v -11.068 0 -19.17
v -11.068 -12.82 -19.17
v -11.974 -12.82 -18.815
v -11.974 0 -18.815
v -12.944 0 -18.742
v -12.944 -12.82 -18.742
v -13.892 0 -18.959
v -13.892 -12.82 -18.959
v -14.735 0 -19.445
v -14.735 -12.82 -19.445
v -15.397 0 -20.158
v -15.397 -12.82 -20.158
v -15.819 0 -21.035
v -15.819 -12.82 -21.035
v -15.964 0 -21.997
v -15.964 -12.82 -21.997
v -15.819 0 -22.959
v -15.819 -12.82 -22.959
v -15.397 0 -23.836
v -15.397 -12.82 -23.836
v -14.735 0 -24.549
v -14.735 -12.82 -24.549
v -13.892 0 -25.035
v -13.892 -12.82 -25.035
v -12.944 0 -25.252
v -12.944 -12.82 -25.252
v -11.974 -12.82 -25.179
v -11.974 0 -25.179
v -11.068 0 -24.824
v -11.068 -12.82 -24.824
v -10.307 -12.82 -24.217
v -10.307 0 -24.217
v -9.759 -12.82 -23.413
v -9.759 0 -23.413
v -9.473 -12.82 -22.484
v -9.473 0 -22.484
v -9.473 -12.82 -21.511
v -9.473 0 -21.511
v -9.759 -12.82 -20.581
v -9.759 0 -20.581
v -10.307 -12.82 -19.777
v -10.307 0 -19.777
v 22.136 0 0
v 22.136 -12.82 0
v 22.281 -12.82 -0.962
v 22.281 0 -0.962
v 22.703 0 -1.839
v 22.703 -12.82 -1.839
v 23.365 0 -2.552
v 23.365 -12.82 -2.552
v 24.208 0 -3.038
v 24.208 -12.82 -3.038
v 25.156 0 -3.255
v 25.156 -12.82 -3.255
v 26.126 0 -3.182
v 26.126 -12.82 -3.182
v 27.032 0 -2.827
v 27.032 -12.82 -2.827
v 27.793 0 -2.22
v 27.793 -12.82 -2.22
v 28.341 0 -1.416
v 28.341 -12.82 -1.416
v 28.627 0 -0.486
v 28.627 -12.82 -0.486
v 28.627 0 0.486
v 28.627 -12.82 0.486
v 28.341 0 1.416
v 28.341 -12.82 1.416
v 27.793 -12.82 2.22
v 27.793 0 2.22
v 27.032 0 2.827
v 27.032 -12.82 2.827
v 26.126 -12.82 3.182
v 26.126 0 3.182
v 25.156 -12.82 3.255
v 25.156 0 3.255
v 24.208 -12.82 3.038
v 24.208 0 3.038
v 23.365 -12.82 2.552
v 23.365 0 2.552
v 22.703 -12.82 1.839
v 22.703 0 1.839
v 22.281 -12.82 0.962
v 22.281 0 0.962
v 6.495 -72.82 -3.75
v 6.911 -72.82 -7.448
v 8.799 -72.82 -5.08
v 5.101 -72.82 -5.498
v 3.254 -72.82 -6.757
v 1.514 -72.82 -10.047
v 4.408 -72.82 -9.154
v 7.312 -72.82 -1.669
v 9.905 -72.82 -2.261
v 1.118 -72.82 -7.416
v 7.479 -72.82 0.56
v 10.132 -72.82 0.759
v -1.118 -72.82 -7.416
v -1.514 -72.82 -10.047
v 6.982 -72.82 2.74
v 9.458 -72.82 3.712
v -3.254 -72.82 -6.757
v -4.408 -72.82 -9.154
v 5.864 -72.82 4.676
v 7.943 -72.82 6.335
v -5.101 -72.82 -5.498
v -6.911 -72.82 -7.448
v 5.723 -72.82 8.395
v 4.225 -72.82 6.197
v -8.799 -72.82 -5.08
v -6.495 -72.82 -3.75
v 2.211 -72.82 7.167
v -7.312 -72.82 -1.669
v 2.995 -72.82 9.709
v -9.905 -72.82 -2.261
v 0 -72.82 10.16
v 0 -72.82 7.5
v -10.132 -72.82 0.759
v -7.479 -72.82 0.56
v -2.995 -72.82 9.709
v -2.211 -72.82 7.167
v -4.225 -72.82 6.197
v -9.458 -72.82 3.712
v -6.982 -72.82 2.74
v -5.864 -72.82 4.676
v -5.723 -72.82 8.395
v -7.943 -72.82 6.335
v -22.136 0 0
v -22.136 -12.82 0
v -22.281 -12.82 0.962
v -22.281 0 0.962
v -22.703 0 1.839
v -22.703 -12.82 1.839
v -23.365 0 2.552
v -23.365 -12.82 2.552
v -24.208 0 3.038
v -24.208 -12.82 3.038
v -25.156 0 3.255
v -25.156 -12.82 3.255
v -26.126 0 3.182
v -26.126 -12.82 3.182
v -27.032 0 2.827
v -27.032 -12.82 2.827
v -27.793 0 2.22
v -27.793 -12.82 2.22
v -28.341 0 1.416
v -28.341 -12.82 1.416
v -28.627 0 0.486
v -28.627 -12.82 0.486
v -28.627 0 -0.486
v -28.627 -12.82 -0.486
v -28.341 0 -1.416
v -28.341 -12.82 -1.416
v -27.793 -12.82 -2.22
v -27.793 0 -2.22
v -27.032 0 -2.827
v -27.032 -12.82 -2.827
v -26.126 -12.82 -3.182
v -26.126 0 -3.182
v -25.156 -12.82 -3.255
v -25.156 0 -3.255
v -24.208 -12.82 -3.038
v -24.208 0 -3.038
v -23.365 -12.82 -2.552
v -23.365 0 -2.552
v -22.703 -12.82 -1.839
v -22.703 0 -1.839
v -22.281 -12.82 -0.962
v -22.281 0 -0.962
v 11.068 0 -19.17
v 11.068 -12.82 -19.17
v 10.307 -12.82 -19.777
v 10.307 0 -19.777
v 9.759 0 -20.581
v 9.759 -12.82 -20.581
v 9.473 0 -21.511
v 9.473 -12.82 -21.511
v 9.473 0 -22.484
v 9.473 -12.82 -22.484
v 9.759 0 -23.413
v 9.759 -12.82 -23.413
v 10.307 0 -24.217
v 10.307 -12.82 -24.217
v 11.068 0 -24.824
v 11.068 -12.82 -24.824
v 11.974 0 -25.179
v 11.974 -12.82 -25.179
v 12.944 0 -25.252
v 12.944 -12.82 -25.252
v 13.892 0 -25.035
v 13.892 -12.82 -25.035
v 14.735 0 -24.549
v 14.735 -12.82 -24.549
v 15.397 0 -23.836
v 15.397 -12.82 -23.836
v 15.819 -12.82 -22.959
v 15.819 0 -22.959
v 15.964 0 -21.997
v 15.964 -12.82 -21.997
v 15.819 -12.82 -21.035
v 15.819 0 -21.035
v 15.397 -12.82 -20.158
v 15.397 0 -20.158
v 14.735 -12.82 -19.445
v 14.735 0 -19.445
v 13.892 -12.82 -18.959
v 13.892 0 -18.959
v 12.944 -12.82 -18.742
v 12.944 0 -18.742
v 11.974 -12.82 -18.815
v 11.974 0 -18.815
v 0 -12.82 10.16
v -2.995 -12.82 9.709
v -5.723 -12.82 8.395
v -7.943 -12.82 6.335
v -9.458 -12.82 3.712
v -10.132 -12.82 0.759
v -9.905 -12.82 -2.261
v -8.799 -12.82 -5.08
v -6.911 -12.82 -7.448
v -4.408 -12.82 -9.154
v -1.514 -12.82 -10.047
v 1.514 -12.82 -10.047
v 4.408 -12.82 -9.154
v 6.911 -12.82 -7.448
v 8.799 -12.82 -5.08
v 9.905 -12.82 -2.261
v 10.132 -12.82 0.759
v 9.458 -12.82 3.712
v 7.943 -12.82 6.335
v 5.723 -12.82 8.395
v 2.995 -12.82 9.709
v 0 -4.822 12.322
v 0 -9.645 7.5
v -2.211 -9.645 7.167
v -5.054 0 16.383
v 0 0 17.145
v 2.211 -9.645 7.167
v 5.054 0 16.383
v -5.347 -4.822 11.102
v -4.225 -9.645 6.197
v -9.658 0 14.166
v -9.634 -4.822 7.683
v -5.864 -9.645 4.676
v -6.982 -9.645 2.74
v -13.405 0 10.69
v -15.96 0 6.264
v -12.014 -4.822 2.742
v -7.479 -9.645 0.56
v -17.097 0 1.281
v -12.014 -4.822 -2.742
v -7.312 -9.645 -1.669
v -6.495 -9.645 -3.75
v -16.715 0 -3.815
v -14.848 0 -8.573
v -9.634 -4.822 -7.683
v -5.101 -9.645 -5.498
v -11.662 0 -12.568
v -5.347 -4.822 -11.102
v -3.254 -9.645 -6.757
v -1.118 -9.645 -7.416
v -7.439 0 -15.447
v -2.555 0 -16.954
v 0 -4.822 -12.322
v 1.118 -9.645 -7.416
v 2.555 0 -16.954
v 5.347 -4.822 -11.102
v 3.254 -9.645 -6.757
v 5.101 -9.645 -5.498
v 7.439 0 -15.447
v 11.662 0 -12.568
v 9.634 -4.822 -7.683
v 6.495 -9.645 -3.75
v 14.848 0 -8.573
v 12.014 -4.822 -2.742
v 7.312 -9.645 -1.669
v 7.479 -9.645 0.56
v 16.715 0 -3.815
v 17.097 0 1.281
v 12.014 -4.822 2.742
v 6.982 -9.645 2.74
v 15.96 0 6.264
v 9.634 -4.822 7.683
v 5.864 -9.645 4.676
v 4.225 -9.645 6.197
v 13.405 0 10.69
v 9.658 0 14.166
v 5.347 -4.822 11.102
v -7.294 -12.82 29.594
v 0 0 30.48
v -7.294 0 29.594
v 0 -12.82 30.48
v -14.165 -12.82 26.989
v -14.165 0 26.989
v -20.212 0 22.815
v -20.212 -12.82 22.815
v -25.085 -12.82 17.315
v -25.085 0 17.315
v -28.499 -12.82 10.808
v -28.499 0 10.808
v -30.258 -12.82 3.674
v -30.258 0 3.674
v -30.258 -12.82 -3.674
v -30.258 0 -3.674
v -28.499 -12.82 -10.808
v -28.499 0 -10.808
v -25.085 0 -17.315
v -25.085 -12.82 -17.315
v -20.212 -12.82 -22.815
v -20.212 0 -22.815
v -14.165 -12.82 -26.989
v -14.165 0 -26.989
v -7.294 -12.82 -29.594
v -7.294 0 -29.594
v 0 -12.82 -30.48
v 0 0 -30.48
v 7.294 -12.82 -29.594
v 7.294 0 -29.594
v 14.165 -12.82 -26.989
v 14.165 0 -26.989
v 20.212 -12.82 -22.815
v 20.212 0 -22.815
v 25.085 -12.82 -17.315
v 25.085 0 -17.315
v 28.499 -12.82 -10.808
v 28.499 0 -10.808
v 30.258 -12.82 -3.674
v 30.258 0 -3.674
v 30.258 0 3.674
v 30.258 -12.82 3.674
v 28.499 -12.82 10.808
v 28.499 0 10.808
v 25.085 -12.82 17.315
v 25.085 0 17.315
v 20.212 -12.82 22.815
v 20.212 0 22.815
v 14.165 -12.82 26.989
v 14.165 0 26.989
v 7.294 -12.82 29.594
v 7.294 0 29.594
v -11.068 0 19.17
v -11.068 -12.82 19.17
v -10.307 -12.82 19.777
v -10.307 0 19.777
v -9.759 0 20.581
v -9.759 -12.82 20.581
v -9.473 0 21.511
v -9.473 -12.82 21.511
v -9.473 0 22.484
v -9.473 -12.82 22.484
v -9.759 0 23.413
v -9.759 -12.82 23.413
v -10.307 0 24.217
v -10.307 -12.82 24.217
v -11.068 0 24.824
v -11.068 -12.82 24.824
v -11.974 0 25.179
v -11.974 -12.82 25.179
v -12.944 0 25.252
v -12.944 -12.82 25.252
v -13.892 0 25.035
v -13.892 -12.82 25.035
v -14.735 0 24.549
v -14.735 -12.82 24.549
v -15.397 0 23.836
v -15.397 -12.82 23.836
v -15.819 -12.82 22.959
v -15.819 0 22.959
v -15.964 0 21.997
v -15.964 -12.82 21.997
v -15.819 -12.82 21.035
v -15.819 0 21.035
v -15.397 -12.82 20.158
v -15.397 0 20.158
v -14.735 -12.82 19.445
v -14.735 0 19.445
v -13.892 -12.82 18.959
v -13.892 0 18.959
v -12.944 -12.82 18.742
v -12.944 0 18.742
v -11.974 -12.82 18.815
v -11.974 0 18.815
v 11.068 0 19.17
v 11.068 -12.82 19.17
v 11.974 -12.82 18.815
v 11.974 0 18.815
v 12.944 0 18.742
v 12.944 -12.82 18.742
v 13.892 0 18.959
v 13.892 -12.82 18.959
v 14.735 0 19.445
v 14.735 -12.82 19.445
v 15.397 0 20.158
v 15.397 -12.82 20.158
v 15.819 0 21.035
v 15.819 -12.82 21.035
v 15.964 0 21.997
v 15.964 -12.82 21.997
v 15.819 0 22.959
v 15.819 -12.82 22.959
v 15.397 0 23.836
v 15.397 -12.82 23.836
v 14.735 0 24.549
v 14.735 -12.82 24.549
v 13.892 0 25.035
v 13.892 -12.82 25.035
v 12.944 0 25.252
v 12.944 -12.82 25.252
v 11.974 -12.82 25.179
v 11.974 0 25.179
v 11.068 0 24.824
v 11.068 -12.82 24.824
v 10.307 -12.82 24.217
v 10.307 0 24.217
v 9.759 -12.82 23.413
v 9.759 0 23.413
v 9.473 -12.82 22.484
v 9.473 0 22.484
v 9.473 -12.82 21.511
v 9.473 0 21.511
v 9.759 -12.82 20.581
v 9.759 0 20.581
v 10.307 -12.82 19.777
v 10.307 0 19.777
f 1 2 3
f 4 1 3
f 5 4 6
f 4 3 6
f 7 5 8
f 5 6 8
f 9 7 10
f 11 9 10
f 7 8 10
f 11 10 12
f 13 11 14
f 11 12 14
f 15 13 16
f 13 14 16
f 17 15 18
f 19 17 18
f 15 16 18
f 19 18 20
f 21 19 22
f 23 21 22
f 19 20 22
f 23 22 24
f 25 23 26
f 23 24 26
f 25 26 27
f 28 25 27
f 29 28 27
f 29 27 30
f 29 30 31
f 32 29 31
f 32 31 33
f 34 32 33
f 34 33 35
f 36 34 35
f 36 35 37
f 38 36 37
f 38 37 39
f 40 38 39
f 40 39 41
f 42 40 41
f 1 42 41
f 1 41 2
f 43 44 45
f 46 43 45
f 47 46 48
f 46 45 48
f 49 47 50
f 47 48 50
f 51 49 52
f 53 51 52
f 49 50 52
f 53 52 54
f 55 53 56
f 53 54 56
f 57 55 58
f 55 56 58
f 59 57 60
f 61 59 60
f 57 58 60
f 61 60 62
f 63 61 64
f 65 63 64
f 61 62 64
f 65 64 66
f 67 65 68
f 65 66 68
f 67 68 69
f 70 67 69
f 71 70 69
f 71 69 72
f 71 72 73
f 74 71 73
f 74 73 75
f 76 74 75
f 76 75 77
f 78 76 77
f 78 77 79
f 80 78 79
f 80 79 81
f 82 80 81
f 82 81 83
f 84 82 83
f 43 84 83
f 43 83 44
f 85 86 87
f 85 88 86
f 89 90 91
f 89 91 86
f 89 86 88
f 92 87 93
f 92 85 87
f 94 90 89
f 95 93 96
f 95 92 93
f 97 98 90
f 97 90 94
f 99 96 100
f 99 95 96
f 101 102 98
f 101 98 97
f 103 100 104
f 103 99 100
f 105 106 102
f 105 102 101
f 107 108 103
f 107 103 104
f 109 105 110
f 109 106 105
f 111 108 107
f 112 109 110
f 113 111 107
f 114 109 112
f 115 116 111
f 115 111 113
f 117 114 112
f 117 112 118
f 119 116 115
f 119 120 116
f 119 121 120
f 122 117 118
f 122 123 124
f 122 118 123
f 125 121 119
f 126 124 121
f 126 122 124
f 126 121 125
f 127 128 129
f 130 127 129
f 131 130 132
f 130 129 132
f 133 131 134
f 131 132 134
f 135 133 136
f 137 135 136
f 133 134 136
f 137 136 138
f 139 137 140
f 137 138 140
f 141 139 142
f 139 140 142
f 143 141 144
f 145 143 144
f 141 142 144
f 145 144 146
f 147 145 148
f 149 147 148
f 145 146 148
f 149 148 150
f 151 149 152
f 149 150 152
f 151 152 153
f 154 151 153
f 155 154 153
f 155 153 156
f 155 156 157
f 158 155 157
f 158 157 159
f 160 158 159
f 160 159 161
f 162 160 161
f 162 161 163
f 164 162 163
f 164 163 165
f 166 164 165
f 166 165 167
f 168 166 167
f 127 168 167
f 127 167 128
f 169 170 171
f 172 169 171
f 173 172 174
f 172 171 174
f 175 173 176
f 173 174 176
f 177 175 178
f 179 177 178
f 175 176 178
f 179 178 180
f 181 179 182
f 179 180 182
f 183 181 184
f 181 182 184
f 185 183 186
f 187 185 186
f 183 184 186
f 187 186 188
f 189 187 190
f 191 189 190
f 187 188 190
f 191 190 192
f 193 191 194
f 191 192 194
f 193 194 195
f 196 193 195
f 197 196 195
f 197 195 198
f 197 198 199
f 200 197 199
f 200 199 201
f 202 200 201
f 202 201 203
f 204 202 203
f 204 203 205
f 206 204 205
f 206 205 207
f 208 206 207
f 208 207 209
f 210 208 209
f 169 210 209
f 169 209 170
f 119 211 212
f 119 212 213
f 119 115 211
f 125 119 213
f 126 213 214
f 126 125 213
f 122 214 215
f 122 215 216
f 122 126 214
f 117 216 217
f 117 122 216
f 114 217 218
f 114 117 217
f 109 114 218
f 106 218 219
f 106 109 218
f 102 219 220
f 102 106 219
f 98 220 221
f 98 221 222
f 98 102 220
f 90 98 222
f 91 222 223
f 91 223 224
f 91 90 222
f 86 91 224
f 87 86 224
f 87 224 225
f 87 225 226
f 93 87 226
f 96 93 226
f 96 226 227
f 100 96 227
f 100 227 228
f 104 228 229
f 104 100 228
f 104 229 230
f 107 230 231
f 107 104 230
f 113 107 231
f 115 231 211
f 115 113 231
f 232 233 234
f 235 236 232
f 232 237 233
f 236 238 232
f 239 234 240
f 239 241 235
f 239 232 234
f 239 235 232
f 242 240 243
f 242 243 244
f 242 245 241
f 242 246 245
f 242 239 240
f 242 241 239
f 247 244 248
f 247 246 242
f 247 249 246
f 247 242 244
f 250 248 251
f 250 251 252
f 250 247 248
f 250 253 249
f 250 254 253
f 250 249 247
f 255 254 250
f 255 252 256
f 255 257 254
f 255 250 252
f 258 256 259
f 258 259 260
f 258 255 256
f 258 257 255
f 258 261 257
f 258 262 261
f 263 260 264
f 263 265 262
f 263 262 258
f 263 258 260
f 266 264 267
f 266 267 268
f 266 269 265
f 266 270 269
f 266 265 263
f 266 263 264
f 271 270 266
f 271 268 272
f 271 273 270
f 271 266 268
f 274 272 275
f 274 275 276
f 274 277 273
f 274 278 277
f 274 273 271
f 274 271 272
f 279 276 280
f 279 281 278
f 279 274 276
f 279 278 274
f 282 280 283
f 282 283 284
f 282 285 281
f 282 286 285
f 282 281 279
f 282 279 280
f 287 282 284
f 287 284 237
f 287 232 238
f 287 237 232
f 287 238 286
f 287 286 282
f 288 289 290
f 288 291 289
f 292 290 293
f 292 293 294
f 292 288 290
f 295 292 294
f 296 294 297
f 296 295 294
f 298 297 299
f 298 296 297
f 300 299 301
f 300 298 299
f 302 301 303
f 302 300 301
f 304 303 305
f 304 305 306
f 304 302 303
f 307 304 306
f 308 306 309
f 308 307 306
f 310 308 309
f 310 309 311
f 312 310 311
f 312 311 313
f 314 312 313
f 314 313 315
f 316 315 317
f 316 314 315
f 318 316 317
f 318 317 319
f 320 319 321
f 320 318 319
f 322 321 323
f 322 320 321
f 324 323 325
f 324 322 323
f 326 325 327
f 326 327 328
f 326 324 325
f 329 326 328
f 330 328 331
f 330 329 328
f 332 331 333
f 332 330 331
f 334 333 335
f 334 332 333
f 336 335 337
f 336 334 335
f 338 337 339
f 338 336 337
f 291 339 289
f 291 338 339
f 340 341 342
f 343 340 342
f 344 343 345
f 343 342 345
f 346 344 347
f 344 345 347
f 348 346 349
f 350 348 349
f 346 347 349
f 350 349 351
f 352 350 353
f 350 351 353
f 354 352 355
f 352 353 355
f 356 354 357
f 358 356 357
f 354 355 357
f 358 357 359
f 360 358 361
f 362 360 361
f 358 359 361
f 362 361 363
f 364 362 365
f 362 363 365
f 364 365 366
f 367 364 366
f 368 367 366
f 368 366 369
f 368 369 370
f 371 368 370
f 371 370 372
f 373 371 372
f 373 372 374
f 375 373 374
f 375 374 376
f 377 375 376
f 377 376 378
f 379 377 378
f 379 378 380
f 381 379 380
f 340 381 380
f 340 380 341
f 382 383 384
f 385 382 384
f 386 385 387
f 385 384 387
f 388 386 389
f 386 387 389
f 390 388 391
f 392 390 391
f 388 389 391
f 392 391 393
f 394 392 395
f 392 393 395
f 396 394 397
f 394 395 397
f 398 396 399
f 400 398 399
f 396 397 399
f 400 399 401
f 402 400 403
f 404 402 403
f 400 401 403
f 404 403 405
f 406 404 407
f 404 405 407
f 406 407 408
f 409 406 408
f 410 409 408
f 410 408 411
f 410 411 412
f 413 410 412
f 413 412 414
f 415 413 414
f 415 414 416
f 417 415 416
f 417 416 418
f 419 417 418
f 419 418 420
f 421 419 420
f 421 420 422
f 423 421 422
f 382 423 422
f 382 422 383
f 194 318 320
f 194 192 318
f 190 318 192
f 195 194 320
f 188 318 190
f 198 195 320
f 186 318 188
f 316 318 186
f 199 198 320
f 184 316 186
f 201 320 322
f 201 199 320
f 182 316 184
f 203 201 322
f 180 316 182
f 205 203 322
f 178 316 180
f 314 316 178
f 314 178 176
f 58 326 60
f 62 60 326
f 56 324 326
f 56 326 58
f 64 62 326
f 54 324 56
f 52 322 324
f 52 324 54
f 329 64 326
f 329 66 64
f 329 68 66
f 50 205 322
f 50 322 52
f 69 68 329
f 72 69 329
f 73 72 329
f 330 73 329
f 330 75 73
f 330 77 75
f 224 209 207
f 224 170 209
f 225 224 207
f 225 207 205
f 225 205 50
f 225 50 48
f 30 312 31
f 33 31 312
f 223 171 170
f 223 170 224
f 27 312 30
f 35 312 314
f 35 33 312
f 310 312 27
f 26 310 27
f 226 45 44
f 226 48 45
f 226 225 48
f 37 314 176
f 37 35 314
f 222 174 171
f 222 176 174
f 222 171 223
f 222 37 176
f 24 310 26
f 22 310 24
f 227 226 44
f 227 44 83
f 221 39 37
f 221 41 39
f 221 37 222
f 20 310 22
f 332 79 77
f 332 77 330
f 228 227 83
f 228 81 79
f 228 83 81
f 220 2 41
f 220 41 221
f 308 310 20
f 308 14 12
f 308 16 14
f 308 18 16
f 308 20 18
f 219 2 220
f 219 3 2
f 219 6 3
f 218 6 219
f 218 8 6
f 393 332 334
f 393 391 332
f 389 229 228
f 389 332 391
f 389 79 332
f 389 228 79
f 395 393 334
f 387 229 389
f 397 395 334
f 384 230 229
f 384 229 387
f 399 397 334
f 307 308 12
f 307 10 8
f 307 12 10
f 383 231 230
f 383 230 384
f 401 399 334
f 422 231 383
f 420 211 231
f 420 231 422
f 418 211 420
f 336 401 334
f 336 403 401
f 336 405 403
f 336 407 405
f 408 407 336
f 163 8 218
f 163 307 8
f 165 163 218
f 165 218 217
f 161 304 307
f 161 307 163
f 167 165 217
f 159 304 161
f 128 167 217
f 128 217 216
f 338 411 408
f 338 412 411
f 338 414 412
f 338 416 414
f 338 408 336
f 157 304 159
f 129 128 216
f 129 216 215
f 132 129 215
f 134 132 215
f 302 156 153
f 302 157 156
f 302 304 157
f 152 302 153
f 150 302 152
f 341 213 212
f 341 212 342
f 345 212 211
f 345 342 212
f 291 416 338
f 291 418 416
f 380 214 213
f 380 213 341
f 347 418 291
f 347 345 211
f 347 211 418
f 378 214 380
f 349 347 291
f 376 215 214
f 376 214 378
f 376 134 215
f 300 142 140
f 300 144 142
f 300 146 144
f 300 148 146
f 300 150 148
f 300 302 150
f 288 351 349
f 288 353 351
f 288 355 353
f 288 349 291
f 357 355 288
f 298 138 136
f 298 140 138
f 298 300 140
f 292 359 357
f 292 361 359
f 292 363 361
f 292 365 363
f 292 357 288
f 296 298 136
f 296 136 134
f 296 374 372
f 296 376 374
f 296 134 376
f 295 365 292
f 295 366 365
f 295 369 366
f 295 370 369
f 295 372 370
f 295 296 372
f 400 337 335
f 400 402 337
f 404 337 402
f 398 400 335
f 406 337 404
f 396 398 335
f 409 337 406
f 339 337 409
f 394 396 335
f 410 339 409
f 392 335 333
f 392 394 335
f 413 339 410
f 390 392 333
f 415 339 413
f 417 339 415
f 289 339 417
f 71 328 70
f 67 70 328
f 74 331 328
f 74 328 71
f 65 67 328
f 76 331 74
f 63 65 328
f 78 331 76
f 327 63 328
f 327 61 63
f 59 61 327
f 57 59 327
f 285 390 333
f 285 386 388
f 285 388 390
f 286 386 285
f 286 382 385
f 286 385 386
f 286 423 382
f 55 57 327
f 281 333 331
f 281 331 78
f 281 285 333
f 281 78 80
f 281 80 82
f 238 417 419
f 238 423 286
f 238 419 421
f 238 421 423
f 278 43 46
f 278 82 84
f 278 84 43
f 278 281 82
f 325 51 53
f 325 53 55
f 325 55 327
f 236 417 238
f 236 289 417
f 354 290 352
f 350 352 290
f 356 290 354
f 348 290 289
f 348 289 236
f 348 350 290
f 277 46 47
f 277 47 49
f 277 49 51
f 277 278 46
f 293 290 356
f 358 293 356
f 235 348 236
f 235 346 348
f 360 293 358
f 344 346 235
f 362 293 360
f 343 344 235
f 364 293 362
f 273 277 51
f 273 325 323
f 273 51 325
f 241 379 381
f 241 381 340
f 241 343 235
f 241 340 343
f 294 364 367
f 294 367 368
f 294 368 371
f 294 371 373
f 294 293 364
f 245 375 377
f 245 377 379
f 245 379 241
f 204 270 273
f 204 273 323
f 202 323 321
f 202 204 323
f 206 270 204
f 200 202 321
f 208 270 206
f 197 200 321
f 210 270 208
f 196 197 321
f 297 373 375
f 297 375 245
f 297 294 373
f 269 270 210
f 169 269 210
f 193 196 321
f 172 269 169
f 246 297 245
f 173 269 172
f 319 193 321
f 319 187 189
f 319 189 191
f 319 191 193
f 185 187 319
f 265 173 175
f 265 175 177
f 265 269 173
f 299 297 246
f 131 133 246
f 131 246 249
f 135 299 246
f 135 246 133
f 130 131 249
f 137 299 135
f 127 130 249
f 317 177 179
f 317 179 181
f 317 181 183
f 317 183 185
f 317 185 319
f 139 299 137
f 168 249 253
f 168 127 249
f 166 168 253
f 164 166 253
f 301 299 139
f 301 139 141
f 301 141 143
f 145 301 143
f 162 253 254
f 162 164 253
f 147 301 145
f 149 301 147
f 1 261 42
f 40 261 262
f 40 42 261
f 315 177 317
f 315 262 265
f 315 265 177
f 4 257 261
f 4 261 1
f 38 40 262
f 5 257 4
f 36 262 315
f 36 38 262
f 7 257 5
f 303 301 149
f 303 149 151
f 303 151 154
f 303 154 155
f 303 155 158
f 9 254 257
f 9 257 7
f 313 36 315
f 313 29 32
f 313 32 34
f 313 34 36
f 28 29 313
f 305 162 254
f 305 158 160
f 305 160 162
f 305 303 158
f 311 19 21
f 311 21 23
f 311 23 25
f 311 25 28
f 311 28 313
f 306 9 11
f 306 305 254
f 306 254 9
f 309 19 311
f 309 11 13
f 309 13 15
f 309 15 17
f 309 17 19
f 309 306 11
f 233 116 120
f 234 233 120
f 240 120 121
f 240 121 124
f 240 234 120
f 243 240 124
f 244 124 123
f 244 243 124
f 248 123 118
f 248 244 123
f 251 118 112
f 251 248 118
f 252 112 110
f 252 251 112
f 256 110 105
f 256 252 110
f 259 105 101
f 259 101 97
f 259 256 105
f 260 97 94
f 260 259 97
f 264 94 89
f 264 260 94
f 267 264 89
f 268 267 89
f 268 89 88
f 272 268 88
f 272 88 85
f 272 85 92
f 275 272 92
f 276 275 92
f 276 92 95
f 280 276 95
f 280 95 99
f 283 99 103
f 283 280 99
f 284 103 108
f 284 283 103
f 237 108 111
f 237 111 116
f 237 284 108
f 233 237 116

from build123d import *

# Parameters (mm, degrees)
F_1_4_CLEARANCE_HOLE1_D = 6.5278
CIRPATTERN1_COUNT       = 6


with BuildPart() as part:
    # Sketch1 → Revolve1 (revolve)
    with BuildSketch(Plane.XY, mode=Mode.PRIVATE) as revolve1_sk:
        Polygon((7.5, -72.82), (7.5, -9.645), (17.145, 0), (30.48, 0), (30.48, -12.82), (10.16, -12.82), (10.16, -72.82), align=None)
    revolve(revolve1_sk.sketch.rotate(Axis((0, 0, 0), (0, -1, 0)), 90), axis=Axis((0, 0, 0), (0, -1, 0)))

    # 1/4 Clearance Hole1 (through all)
    with Locations(Plane(origin=(0, 0, 0), x_dir=(1, 0, 0), z_dir=(0, 1, 0))):
        with Locations((25.4, 0)):
            f_1_4_clearance_hole1 = Hole(F_1_4_CLEARANCE_HOLE1_D / 2)

    # CirPattern1: 1/4 Clearance Hole1 ×6 about axis
    cirpattern1_axis = Axis((0, 0, 0), (0, 1, 0))
    for i in range(1, CIRPATTERN1_COUNT):
        add(f_1_4_clearance_hole1.rotate(cirpattern1_axis, i * 360 / CIRPATTERN1_COUNT), mode=Mode.SUBTRACT)


solid = part.part
